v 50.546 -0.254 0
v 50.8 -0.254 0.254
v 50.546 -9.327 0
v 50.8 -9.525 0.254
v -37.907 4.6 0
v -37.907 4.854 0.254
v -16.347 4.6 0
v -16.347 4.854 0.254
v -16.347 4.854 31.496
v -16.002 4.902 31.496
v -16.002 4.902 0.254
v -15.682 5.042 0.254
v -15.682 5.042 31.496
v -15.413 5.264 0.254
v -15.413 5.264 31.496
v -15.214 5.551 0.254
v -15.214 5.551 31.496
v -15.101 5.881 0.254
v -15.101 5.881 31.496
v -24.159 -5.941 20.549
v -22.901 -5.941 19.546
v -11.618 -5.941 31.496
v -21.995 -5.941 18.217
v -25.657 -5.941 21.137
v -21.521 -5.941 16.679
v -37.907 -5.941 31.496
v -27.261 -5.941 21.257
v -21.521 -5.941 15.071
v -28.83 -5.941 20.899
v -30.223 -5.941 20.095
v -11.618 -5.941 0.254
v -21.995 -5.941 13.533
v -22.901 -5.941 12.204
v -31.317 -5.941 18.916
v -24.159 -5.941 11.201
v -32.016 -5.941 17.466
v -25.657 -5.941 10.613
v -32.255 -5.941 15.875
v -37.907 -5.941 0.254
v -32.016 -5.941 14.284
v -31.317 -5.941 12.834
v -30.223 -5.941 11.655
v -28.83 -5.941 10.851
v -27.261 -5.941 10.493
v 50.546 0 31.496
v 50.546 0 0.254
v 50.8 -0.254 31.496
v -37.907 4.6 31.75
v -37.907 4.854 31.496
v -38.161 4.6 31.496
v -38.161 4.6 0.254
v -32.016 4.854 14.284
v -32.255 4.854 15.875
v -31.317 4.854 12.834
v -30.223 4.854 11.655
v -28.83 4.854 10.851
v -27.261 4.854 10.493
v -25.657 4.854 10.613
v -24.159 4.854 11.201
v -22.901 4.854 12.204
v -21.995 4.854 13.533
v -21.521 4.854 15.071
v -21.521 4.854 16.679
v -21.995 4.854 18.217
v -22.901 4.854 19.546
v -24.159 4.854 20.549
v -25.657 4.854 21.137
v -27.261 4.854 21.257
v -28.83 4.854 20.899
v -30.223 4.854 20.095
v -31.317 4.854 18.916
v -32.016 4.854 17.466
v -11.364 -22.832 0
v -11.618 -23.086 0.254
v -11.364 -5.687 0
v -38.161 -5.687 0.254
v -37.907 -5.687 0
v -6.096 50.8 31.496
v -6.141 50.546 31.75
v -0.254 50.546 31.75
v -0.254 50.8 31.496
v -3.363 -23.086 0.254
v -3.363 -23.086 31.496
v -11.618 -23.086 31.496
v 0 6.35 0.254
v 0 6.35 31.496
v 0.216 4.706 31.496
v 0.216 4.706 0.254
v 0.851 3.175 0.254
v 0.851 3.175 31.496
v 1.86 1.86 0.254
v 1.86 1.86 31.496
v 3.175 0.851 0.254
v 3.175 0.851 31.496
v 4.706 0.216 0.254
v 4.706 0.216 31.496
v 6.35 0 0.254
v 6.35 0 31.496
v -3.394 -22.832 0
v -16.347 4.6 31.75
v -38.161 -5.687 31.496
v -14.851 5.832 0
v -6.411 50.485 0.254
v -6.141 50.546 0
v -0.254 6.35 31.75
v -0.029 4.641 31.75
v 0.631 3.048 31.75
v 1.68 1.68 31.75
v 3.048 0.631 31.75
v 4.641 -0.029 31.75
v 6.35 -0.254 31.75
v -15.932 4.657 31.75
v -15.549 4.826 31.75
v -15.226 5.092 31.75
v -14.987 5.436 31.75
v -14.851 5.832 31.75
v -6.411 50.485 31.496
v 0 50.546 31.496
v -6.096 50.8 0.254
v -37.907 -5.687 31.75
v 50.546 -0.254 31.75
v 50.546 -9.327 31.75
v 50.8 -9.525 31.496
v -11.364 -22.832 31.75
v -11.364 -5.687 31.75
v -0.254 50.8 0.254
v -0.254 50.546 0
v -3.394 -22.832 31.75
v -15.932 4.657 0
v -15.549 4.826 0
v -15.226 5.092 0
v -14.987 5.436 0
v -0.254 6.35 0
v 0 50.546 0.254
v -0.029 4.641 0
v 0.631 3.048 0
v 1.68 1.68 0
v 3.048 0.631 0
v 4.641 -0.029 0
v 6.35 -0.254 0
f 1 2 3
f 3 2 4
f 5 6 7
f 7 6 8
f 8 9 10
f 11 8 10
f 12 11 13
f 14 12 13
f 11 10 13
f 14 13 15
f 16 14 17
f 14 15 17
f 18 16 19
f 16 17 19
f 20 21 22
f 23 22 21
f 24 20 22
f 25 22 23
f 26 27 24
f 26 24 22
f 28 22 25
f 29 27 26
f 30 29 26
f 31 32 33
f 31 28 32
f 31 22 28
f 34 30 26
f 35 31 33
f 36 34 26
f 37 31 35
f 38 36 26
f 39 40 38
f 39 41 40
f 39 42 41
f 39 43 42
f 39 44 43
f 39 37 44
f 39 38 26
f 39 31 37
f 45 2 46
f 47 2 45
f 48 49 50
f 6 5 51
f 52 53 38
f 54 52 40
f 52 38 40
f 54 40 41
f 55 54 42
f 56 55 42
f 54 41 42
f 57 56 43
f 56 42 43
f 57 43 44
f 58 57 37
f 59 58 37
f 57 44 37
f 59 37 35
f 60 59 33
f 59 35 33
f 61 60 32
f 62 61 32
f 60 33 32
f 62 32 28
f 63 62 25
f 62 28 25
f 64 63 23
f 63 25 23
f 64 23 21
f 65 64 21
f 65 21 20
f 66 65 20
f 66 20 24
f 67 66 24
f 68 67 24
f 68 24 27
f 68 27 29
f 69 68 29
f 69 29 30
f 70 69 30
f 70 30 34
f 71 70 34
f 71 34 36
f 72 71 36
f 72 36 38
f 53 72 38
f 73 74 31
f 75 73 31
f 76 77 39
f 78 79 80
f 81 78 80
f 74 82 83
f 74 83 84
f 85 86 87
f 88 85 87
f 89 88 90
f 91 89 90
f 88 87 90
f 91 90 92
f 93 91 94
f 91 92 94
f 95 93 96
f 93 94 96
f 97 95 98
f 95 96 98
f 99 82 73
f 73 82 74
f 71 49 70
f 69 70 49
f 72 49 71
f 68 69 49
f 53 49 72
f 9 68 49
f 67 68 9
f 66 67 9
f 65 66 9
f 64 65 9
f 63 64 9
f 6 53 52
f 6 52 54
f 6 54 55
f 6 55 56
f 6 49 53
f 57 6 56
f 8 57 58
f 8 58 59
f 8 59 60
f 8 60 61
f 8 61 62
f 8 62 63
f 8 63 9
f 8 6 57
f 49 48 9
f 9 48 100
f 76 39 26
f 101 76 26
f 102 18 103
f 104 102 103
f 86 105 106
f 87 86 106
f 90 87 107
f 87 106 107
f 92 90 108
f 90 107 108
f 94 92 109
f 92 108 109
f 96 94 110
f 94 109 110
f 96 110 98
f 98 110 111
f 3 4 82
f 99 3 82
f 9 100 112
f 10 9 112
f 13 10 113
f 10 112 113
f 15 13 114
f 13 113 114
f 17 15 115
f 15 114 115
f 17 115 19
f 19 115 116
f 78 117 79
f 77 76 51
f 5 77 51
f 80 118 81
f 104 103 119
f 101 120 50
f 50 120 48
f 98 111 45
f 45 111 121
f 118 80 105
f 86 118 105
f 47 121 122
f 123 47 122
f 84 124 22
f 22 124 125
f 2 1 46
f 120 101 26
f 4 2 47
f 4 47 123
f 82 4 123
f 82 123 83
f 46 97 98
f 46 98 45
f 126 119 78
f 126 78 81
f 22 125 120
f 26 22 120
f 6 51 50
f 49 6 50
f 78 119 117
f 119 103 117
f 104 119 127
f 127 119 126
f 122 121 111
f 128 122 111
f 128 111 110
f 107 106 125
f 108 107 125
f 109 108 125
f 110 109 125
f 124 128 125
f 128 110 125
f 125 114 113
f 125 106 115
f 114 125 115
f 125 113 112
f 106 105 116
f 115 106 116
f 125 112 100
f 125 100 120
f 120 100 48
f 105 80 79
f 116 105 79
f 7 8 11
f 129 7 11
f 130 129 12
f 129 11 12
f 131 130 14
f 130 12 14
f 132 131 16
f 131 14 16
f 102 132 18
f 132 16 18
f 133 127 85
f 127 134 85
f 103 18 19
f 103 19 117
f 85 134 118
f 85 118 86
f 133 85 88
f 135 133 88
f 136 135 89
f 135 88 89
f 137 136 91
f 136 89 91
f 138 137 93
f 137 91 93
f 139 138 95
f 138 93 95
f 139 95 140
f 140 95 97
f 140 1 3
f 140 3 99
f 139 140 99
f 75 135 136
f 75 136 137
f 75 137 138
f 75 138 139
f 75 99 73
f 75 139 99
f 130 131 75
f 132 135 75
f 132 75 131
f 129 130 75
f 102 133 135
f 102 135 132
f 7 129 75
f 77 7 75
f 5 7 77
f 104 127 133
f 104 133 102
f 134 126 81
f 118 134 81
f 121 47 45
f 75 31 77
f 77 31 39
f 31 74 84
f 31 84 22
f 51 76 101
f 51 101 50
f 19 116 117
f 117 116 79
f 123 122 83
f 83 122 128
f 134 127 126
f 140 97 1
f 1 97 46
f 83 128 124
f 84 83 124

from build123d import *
from OCP.BRepFilletAPI import BRepFilletAPI_MakeChamfer

# Parameters (mm, degrees)
BOSS_EXTRUDE1_DEPTH          = 31.75
F_3_8_0_375_DIAMETER_HOLE1_D = 10.795
FILLET1_R                    = 1.27
FILLET2_R                    = 6.35
CHAMFER1_SIZE                = 0.254
CHAMFER1_SIZE2               = 0.321383695


with BuildPart() as part:
    # Sketch1 → Boss-Extrude1 (new body)
    with BuildSketch(Plane.XY):
        Polygon((0, 0), (50.8, 0), (50.8, -9.525), (-3.3628076, -23.086314), (-11.6178076, -23.086314), (-11.6178076, -5.941314), (-38.1608076, -5.941314), (-38.1608076, 4.853686), (-15.3008076, 4.853686), (-6.35, 50.8), (0, 50.8), align=None)
    extrude(amount=BOSS_EXTRUDE1_DEPTH)

    # 3/8 (0.375) Diameter Hole1 (through all)
    with Locations(Plane(origin=(0, 4.853686, 0), x_dir=(1, 0, 0), z_dir=(0, 1, 0))):
        with Locations((-26.8578076, -15.875)):
            Hole(F_3_8_0_375_DIAMETER_HOLE1_D / 2)

    # Fillet1
    fillet1_edges = [part.edges().sort_by_distance(p)[0] for p in [
        (-15.3008076, 4.853686, 15.875),
    ]]
    fillet(fillet1_edges, radius=FILLET1_R)

    # Fillet2
    fillet2_edges = [part.edges().sort_by_distance(p)[0] for p in [
        (0, 0, 15.875),
    ]]
    fillet(fillet2_edges, radius=FILLET2_R)

    # Chamfer1: one chamfer whose edges measure the first distance from different faces: ONE call of the kernel's chamfer builder (chamfer() names one face for all edges)
    chamfer1_edges_1 = [part.edges().sort_by_distance(p)[0] for p in [
        (28.575, 0, 0),
        (50.8, -4.7625, 0),
        (23.7185962, -16.305657, 0),
        (-7.4903076, -23.086314, 0),
        (-11.6178076, -14.513814, 0),
        (-10.725353572, 28.340421149, 31.75),
        (-24.8893076, -5.941314, 0),
        (-38.1608076, -0.543814, 0),
        (-10.725353572, 28.340421149, 0),
        (-3.175, 50.8, 0),
        (50.8, 0, 15.875),
        (-38.1608076, -5.941314, 15.875),
        (-38.1608076, 4.853686, 15.875),
        (0, 50.8, 15.875),
        (-38.1608076, -0.543814, 31.75),
        (-24.8893076, -5.941314, 31.75),
        (-11.6178076, -14.513814, 31.75),
        (-7.4903076, -23.086314, 31.75),
        (23.7185962, -16.305657, 31.75),
        (-27.254040401, 4.853686, 0),
        (-27.254040401, 4.853686, 31.75),
        (50.8, -4.7625, 31.75),
        (-15.539656801, 5.143555524, 0),
        (-15.539656801, 5.143555524, 31.75),
        (28.575, 0, 31.75),
        (0, 28.575, 0),
        (0, 28.575, 31.75),
        (1.859871939, 1.859871939, 0),
        (1.859871939, 1.859871939, 31.75),
        (-3.175, 50.8, 31.75),
    ]]
    chamfer1_edges_2 = [part.edges().sort_by_distance(p)[0] for p in [
        (-6.35, 50.8, 15.875),
    ]]
    chamfer1_side_2 = [part.faces().sort_by_distance(p)[0] for p in [
        (-3.175, 50.8, 15.875),
    ]]
    chamfer1 = BRepFilletAPI_MakeChamfer(part.part.solid().wrapped)
    for e in chamfer1_edges_1:
        chamfer1.Add(CHAMFER1_SIZE, e.wrapped)
    for e in chamfer1_edges_2:
        chamfer1.Add(CHAMFER1_SIZE, CHAMFER1_SIZE2, e.wrapped, chamfer1_side_2[0].wrapped)  # the first distance lies on this face
    add(Compound.cast(chamfer1.Shape()), mode=Mode.REPLACE)


solid = part.part
